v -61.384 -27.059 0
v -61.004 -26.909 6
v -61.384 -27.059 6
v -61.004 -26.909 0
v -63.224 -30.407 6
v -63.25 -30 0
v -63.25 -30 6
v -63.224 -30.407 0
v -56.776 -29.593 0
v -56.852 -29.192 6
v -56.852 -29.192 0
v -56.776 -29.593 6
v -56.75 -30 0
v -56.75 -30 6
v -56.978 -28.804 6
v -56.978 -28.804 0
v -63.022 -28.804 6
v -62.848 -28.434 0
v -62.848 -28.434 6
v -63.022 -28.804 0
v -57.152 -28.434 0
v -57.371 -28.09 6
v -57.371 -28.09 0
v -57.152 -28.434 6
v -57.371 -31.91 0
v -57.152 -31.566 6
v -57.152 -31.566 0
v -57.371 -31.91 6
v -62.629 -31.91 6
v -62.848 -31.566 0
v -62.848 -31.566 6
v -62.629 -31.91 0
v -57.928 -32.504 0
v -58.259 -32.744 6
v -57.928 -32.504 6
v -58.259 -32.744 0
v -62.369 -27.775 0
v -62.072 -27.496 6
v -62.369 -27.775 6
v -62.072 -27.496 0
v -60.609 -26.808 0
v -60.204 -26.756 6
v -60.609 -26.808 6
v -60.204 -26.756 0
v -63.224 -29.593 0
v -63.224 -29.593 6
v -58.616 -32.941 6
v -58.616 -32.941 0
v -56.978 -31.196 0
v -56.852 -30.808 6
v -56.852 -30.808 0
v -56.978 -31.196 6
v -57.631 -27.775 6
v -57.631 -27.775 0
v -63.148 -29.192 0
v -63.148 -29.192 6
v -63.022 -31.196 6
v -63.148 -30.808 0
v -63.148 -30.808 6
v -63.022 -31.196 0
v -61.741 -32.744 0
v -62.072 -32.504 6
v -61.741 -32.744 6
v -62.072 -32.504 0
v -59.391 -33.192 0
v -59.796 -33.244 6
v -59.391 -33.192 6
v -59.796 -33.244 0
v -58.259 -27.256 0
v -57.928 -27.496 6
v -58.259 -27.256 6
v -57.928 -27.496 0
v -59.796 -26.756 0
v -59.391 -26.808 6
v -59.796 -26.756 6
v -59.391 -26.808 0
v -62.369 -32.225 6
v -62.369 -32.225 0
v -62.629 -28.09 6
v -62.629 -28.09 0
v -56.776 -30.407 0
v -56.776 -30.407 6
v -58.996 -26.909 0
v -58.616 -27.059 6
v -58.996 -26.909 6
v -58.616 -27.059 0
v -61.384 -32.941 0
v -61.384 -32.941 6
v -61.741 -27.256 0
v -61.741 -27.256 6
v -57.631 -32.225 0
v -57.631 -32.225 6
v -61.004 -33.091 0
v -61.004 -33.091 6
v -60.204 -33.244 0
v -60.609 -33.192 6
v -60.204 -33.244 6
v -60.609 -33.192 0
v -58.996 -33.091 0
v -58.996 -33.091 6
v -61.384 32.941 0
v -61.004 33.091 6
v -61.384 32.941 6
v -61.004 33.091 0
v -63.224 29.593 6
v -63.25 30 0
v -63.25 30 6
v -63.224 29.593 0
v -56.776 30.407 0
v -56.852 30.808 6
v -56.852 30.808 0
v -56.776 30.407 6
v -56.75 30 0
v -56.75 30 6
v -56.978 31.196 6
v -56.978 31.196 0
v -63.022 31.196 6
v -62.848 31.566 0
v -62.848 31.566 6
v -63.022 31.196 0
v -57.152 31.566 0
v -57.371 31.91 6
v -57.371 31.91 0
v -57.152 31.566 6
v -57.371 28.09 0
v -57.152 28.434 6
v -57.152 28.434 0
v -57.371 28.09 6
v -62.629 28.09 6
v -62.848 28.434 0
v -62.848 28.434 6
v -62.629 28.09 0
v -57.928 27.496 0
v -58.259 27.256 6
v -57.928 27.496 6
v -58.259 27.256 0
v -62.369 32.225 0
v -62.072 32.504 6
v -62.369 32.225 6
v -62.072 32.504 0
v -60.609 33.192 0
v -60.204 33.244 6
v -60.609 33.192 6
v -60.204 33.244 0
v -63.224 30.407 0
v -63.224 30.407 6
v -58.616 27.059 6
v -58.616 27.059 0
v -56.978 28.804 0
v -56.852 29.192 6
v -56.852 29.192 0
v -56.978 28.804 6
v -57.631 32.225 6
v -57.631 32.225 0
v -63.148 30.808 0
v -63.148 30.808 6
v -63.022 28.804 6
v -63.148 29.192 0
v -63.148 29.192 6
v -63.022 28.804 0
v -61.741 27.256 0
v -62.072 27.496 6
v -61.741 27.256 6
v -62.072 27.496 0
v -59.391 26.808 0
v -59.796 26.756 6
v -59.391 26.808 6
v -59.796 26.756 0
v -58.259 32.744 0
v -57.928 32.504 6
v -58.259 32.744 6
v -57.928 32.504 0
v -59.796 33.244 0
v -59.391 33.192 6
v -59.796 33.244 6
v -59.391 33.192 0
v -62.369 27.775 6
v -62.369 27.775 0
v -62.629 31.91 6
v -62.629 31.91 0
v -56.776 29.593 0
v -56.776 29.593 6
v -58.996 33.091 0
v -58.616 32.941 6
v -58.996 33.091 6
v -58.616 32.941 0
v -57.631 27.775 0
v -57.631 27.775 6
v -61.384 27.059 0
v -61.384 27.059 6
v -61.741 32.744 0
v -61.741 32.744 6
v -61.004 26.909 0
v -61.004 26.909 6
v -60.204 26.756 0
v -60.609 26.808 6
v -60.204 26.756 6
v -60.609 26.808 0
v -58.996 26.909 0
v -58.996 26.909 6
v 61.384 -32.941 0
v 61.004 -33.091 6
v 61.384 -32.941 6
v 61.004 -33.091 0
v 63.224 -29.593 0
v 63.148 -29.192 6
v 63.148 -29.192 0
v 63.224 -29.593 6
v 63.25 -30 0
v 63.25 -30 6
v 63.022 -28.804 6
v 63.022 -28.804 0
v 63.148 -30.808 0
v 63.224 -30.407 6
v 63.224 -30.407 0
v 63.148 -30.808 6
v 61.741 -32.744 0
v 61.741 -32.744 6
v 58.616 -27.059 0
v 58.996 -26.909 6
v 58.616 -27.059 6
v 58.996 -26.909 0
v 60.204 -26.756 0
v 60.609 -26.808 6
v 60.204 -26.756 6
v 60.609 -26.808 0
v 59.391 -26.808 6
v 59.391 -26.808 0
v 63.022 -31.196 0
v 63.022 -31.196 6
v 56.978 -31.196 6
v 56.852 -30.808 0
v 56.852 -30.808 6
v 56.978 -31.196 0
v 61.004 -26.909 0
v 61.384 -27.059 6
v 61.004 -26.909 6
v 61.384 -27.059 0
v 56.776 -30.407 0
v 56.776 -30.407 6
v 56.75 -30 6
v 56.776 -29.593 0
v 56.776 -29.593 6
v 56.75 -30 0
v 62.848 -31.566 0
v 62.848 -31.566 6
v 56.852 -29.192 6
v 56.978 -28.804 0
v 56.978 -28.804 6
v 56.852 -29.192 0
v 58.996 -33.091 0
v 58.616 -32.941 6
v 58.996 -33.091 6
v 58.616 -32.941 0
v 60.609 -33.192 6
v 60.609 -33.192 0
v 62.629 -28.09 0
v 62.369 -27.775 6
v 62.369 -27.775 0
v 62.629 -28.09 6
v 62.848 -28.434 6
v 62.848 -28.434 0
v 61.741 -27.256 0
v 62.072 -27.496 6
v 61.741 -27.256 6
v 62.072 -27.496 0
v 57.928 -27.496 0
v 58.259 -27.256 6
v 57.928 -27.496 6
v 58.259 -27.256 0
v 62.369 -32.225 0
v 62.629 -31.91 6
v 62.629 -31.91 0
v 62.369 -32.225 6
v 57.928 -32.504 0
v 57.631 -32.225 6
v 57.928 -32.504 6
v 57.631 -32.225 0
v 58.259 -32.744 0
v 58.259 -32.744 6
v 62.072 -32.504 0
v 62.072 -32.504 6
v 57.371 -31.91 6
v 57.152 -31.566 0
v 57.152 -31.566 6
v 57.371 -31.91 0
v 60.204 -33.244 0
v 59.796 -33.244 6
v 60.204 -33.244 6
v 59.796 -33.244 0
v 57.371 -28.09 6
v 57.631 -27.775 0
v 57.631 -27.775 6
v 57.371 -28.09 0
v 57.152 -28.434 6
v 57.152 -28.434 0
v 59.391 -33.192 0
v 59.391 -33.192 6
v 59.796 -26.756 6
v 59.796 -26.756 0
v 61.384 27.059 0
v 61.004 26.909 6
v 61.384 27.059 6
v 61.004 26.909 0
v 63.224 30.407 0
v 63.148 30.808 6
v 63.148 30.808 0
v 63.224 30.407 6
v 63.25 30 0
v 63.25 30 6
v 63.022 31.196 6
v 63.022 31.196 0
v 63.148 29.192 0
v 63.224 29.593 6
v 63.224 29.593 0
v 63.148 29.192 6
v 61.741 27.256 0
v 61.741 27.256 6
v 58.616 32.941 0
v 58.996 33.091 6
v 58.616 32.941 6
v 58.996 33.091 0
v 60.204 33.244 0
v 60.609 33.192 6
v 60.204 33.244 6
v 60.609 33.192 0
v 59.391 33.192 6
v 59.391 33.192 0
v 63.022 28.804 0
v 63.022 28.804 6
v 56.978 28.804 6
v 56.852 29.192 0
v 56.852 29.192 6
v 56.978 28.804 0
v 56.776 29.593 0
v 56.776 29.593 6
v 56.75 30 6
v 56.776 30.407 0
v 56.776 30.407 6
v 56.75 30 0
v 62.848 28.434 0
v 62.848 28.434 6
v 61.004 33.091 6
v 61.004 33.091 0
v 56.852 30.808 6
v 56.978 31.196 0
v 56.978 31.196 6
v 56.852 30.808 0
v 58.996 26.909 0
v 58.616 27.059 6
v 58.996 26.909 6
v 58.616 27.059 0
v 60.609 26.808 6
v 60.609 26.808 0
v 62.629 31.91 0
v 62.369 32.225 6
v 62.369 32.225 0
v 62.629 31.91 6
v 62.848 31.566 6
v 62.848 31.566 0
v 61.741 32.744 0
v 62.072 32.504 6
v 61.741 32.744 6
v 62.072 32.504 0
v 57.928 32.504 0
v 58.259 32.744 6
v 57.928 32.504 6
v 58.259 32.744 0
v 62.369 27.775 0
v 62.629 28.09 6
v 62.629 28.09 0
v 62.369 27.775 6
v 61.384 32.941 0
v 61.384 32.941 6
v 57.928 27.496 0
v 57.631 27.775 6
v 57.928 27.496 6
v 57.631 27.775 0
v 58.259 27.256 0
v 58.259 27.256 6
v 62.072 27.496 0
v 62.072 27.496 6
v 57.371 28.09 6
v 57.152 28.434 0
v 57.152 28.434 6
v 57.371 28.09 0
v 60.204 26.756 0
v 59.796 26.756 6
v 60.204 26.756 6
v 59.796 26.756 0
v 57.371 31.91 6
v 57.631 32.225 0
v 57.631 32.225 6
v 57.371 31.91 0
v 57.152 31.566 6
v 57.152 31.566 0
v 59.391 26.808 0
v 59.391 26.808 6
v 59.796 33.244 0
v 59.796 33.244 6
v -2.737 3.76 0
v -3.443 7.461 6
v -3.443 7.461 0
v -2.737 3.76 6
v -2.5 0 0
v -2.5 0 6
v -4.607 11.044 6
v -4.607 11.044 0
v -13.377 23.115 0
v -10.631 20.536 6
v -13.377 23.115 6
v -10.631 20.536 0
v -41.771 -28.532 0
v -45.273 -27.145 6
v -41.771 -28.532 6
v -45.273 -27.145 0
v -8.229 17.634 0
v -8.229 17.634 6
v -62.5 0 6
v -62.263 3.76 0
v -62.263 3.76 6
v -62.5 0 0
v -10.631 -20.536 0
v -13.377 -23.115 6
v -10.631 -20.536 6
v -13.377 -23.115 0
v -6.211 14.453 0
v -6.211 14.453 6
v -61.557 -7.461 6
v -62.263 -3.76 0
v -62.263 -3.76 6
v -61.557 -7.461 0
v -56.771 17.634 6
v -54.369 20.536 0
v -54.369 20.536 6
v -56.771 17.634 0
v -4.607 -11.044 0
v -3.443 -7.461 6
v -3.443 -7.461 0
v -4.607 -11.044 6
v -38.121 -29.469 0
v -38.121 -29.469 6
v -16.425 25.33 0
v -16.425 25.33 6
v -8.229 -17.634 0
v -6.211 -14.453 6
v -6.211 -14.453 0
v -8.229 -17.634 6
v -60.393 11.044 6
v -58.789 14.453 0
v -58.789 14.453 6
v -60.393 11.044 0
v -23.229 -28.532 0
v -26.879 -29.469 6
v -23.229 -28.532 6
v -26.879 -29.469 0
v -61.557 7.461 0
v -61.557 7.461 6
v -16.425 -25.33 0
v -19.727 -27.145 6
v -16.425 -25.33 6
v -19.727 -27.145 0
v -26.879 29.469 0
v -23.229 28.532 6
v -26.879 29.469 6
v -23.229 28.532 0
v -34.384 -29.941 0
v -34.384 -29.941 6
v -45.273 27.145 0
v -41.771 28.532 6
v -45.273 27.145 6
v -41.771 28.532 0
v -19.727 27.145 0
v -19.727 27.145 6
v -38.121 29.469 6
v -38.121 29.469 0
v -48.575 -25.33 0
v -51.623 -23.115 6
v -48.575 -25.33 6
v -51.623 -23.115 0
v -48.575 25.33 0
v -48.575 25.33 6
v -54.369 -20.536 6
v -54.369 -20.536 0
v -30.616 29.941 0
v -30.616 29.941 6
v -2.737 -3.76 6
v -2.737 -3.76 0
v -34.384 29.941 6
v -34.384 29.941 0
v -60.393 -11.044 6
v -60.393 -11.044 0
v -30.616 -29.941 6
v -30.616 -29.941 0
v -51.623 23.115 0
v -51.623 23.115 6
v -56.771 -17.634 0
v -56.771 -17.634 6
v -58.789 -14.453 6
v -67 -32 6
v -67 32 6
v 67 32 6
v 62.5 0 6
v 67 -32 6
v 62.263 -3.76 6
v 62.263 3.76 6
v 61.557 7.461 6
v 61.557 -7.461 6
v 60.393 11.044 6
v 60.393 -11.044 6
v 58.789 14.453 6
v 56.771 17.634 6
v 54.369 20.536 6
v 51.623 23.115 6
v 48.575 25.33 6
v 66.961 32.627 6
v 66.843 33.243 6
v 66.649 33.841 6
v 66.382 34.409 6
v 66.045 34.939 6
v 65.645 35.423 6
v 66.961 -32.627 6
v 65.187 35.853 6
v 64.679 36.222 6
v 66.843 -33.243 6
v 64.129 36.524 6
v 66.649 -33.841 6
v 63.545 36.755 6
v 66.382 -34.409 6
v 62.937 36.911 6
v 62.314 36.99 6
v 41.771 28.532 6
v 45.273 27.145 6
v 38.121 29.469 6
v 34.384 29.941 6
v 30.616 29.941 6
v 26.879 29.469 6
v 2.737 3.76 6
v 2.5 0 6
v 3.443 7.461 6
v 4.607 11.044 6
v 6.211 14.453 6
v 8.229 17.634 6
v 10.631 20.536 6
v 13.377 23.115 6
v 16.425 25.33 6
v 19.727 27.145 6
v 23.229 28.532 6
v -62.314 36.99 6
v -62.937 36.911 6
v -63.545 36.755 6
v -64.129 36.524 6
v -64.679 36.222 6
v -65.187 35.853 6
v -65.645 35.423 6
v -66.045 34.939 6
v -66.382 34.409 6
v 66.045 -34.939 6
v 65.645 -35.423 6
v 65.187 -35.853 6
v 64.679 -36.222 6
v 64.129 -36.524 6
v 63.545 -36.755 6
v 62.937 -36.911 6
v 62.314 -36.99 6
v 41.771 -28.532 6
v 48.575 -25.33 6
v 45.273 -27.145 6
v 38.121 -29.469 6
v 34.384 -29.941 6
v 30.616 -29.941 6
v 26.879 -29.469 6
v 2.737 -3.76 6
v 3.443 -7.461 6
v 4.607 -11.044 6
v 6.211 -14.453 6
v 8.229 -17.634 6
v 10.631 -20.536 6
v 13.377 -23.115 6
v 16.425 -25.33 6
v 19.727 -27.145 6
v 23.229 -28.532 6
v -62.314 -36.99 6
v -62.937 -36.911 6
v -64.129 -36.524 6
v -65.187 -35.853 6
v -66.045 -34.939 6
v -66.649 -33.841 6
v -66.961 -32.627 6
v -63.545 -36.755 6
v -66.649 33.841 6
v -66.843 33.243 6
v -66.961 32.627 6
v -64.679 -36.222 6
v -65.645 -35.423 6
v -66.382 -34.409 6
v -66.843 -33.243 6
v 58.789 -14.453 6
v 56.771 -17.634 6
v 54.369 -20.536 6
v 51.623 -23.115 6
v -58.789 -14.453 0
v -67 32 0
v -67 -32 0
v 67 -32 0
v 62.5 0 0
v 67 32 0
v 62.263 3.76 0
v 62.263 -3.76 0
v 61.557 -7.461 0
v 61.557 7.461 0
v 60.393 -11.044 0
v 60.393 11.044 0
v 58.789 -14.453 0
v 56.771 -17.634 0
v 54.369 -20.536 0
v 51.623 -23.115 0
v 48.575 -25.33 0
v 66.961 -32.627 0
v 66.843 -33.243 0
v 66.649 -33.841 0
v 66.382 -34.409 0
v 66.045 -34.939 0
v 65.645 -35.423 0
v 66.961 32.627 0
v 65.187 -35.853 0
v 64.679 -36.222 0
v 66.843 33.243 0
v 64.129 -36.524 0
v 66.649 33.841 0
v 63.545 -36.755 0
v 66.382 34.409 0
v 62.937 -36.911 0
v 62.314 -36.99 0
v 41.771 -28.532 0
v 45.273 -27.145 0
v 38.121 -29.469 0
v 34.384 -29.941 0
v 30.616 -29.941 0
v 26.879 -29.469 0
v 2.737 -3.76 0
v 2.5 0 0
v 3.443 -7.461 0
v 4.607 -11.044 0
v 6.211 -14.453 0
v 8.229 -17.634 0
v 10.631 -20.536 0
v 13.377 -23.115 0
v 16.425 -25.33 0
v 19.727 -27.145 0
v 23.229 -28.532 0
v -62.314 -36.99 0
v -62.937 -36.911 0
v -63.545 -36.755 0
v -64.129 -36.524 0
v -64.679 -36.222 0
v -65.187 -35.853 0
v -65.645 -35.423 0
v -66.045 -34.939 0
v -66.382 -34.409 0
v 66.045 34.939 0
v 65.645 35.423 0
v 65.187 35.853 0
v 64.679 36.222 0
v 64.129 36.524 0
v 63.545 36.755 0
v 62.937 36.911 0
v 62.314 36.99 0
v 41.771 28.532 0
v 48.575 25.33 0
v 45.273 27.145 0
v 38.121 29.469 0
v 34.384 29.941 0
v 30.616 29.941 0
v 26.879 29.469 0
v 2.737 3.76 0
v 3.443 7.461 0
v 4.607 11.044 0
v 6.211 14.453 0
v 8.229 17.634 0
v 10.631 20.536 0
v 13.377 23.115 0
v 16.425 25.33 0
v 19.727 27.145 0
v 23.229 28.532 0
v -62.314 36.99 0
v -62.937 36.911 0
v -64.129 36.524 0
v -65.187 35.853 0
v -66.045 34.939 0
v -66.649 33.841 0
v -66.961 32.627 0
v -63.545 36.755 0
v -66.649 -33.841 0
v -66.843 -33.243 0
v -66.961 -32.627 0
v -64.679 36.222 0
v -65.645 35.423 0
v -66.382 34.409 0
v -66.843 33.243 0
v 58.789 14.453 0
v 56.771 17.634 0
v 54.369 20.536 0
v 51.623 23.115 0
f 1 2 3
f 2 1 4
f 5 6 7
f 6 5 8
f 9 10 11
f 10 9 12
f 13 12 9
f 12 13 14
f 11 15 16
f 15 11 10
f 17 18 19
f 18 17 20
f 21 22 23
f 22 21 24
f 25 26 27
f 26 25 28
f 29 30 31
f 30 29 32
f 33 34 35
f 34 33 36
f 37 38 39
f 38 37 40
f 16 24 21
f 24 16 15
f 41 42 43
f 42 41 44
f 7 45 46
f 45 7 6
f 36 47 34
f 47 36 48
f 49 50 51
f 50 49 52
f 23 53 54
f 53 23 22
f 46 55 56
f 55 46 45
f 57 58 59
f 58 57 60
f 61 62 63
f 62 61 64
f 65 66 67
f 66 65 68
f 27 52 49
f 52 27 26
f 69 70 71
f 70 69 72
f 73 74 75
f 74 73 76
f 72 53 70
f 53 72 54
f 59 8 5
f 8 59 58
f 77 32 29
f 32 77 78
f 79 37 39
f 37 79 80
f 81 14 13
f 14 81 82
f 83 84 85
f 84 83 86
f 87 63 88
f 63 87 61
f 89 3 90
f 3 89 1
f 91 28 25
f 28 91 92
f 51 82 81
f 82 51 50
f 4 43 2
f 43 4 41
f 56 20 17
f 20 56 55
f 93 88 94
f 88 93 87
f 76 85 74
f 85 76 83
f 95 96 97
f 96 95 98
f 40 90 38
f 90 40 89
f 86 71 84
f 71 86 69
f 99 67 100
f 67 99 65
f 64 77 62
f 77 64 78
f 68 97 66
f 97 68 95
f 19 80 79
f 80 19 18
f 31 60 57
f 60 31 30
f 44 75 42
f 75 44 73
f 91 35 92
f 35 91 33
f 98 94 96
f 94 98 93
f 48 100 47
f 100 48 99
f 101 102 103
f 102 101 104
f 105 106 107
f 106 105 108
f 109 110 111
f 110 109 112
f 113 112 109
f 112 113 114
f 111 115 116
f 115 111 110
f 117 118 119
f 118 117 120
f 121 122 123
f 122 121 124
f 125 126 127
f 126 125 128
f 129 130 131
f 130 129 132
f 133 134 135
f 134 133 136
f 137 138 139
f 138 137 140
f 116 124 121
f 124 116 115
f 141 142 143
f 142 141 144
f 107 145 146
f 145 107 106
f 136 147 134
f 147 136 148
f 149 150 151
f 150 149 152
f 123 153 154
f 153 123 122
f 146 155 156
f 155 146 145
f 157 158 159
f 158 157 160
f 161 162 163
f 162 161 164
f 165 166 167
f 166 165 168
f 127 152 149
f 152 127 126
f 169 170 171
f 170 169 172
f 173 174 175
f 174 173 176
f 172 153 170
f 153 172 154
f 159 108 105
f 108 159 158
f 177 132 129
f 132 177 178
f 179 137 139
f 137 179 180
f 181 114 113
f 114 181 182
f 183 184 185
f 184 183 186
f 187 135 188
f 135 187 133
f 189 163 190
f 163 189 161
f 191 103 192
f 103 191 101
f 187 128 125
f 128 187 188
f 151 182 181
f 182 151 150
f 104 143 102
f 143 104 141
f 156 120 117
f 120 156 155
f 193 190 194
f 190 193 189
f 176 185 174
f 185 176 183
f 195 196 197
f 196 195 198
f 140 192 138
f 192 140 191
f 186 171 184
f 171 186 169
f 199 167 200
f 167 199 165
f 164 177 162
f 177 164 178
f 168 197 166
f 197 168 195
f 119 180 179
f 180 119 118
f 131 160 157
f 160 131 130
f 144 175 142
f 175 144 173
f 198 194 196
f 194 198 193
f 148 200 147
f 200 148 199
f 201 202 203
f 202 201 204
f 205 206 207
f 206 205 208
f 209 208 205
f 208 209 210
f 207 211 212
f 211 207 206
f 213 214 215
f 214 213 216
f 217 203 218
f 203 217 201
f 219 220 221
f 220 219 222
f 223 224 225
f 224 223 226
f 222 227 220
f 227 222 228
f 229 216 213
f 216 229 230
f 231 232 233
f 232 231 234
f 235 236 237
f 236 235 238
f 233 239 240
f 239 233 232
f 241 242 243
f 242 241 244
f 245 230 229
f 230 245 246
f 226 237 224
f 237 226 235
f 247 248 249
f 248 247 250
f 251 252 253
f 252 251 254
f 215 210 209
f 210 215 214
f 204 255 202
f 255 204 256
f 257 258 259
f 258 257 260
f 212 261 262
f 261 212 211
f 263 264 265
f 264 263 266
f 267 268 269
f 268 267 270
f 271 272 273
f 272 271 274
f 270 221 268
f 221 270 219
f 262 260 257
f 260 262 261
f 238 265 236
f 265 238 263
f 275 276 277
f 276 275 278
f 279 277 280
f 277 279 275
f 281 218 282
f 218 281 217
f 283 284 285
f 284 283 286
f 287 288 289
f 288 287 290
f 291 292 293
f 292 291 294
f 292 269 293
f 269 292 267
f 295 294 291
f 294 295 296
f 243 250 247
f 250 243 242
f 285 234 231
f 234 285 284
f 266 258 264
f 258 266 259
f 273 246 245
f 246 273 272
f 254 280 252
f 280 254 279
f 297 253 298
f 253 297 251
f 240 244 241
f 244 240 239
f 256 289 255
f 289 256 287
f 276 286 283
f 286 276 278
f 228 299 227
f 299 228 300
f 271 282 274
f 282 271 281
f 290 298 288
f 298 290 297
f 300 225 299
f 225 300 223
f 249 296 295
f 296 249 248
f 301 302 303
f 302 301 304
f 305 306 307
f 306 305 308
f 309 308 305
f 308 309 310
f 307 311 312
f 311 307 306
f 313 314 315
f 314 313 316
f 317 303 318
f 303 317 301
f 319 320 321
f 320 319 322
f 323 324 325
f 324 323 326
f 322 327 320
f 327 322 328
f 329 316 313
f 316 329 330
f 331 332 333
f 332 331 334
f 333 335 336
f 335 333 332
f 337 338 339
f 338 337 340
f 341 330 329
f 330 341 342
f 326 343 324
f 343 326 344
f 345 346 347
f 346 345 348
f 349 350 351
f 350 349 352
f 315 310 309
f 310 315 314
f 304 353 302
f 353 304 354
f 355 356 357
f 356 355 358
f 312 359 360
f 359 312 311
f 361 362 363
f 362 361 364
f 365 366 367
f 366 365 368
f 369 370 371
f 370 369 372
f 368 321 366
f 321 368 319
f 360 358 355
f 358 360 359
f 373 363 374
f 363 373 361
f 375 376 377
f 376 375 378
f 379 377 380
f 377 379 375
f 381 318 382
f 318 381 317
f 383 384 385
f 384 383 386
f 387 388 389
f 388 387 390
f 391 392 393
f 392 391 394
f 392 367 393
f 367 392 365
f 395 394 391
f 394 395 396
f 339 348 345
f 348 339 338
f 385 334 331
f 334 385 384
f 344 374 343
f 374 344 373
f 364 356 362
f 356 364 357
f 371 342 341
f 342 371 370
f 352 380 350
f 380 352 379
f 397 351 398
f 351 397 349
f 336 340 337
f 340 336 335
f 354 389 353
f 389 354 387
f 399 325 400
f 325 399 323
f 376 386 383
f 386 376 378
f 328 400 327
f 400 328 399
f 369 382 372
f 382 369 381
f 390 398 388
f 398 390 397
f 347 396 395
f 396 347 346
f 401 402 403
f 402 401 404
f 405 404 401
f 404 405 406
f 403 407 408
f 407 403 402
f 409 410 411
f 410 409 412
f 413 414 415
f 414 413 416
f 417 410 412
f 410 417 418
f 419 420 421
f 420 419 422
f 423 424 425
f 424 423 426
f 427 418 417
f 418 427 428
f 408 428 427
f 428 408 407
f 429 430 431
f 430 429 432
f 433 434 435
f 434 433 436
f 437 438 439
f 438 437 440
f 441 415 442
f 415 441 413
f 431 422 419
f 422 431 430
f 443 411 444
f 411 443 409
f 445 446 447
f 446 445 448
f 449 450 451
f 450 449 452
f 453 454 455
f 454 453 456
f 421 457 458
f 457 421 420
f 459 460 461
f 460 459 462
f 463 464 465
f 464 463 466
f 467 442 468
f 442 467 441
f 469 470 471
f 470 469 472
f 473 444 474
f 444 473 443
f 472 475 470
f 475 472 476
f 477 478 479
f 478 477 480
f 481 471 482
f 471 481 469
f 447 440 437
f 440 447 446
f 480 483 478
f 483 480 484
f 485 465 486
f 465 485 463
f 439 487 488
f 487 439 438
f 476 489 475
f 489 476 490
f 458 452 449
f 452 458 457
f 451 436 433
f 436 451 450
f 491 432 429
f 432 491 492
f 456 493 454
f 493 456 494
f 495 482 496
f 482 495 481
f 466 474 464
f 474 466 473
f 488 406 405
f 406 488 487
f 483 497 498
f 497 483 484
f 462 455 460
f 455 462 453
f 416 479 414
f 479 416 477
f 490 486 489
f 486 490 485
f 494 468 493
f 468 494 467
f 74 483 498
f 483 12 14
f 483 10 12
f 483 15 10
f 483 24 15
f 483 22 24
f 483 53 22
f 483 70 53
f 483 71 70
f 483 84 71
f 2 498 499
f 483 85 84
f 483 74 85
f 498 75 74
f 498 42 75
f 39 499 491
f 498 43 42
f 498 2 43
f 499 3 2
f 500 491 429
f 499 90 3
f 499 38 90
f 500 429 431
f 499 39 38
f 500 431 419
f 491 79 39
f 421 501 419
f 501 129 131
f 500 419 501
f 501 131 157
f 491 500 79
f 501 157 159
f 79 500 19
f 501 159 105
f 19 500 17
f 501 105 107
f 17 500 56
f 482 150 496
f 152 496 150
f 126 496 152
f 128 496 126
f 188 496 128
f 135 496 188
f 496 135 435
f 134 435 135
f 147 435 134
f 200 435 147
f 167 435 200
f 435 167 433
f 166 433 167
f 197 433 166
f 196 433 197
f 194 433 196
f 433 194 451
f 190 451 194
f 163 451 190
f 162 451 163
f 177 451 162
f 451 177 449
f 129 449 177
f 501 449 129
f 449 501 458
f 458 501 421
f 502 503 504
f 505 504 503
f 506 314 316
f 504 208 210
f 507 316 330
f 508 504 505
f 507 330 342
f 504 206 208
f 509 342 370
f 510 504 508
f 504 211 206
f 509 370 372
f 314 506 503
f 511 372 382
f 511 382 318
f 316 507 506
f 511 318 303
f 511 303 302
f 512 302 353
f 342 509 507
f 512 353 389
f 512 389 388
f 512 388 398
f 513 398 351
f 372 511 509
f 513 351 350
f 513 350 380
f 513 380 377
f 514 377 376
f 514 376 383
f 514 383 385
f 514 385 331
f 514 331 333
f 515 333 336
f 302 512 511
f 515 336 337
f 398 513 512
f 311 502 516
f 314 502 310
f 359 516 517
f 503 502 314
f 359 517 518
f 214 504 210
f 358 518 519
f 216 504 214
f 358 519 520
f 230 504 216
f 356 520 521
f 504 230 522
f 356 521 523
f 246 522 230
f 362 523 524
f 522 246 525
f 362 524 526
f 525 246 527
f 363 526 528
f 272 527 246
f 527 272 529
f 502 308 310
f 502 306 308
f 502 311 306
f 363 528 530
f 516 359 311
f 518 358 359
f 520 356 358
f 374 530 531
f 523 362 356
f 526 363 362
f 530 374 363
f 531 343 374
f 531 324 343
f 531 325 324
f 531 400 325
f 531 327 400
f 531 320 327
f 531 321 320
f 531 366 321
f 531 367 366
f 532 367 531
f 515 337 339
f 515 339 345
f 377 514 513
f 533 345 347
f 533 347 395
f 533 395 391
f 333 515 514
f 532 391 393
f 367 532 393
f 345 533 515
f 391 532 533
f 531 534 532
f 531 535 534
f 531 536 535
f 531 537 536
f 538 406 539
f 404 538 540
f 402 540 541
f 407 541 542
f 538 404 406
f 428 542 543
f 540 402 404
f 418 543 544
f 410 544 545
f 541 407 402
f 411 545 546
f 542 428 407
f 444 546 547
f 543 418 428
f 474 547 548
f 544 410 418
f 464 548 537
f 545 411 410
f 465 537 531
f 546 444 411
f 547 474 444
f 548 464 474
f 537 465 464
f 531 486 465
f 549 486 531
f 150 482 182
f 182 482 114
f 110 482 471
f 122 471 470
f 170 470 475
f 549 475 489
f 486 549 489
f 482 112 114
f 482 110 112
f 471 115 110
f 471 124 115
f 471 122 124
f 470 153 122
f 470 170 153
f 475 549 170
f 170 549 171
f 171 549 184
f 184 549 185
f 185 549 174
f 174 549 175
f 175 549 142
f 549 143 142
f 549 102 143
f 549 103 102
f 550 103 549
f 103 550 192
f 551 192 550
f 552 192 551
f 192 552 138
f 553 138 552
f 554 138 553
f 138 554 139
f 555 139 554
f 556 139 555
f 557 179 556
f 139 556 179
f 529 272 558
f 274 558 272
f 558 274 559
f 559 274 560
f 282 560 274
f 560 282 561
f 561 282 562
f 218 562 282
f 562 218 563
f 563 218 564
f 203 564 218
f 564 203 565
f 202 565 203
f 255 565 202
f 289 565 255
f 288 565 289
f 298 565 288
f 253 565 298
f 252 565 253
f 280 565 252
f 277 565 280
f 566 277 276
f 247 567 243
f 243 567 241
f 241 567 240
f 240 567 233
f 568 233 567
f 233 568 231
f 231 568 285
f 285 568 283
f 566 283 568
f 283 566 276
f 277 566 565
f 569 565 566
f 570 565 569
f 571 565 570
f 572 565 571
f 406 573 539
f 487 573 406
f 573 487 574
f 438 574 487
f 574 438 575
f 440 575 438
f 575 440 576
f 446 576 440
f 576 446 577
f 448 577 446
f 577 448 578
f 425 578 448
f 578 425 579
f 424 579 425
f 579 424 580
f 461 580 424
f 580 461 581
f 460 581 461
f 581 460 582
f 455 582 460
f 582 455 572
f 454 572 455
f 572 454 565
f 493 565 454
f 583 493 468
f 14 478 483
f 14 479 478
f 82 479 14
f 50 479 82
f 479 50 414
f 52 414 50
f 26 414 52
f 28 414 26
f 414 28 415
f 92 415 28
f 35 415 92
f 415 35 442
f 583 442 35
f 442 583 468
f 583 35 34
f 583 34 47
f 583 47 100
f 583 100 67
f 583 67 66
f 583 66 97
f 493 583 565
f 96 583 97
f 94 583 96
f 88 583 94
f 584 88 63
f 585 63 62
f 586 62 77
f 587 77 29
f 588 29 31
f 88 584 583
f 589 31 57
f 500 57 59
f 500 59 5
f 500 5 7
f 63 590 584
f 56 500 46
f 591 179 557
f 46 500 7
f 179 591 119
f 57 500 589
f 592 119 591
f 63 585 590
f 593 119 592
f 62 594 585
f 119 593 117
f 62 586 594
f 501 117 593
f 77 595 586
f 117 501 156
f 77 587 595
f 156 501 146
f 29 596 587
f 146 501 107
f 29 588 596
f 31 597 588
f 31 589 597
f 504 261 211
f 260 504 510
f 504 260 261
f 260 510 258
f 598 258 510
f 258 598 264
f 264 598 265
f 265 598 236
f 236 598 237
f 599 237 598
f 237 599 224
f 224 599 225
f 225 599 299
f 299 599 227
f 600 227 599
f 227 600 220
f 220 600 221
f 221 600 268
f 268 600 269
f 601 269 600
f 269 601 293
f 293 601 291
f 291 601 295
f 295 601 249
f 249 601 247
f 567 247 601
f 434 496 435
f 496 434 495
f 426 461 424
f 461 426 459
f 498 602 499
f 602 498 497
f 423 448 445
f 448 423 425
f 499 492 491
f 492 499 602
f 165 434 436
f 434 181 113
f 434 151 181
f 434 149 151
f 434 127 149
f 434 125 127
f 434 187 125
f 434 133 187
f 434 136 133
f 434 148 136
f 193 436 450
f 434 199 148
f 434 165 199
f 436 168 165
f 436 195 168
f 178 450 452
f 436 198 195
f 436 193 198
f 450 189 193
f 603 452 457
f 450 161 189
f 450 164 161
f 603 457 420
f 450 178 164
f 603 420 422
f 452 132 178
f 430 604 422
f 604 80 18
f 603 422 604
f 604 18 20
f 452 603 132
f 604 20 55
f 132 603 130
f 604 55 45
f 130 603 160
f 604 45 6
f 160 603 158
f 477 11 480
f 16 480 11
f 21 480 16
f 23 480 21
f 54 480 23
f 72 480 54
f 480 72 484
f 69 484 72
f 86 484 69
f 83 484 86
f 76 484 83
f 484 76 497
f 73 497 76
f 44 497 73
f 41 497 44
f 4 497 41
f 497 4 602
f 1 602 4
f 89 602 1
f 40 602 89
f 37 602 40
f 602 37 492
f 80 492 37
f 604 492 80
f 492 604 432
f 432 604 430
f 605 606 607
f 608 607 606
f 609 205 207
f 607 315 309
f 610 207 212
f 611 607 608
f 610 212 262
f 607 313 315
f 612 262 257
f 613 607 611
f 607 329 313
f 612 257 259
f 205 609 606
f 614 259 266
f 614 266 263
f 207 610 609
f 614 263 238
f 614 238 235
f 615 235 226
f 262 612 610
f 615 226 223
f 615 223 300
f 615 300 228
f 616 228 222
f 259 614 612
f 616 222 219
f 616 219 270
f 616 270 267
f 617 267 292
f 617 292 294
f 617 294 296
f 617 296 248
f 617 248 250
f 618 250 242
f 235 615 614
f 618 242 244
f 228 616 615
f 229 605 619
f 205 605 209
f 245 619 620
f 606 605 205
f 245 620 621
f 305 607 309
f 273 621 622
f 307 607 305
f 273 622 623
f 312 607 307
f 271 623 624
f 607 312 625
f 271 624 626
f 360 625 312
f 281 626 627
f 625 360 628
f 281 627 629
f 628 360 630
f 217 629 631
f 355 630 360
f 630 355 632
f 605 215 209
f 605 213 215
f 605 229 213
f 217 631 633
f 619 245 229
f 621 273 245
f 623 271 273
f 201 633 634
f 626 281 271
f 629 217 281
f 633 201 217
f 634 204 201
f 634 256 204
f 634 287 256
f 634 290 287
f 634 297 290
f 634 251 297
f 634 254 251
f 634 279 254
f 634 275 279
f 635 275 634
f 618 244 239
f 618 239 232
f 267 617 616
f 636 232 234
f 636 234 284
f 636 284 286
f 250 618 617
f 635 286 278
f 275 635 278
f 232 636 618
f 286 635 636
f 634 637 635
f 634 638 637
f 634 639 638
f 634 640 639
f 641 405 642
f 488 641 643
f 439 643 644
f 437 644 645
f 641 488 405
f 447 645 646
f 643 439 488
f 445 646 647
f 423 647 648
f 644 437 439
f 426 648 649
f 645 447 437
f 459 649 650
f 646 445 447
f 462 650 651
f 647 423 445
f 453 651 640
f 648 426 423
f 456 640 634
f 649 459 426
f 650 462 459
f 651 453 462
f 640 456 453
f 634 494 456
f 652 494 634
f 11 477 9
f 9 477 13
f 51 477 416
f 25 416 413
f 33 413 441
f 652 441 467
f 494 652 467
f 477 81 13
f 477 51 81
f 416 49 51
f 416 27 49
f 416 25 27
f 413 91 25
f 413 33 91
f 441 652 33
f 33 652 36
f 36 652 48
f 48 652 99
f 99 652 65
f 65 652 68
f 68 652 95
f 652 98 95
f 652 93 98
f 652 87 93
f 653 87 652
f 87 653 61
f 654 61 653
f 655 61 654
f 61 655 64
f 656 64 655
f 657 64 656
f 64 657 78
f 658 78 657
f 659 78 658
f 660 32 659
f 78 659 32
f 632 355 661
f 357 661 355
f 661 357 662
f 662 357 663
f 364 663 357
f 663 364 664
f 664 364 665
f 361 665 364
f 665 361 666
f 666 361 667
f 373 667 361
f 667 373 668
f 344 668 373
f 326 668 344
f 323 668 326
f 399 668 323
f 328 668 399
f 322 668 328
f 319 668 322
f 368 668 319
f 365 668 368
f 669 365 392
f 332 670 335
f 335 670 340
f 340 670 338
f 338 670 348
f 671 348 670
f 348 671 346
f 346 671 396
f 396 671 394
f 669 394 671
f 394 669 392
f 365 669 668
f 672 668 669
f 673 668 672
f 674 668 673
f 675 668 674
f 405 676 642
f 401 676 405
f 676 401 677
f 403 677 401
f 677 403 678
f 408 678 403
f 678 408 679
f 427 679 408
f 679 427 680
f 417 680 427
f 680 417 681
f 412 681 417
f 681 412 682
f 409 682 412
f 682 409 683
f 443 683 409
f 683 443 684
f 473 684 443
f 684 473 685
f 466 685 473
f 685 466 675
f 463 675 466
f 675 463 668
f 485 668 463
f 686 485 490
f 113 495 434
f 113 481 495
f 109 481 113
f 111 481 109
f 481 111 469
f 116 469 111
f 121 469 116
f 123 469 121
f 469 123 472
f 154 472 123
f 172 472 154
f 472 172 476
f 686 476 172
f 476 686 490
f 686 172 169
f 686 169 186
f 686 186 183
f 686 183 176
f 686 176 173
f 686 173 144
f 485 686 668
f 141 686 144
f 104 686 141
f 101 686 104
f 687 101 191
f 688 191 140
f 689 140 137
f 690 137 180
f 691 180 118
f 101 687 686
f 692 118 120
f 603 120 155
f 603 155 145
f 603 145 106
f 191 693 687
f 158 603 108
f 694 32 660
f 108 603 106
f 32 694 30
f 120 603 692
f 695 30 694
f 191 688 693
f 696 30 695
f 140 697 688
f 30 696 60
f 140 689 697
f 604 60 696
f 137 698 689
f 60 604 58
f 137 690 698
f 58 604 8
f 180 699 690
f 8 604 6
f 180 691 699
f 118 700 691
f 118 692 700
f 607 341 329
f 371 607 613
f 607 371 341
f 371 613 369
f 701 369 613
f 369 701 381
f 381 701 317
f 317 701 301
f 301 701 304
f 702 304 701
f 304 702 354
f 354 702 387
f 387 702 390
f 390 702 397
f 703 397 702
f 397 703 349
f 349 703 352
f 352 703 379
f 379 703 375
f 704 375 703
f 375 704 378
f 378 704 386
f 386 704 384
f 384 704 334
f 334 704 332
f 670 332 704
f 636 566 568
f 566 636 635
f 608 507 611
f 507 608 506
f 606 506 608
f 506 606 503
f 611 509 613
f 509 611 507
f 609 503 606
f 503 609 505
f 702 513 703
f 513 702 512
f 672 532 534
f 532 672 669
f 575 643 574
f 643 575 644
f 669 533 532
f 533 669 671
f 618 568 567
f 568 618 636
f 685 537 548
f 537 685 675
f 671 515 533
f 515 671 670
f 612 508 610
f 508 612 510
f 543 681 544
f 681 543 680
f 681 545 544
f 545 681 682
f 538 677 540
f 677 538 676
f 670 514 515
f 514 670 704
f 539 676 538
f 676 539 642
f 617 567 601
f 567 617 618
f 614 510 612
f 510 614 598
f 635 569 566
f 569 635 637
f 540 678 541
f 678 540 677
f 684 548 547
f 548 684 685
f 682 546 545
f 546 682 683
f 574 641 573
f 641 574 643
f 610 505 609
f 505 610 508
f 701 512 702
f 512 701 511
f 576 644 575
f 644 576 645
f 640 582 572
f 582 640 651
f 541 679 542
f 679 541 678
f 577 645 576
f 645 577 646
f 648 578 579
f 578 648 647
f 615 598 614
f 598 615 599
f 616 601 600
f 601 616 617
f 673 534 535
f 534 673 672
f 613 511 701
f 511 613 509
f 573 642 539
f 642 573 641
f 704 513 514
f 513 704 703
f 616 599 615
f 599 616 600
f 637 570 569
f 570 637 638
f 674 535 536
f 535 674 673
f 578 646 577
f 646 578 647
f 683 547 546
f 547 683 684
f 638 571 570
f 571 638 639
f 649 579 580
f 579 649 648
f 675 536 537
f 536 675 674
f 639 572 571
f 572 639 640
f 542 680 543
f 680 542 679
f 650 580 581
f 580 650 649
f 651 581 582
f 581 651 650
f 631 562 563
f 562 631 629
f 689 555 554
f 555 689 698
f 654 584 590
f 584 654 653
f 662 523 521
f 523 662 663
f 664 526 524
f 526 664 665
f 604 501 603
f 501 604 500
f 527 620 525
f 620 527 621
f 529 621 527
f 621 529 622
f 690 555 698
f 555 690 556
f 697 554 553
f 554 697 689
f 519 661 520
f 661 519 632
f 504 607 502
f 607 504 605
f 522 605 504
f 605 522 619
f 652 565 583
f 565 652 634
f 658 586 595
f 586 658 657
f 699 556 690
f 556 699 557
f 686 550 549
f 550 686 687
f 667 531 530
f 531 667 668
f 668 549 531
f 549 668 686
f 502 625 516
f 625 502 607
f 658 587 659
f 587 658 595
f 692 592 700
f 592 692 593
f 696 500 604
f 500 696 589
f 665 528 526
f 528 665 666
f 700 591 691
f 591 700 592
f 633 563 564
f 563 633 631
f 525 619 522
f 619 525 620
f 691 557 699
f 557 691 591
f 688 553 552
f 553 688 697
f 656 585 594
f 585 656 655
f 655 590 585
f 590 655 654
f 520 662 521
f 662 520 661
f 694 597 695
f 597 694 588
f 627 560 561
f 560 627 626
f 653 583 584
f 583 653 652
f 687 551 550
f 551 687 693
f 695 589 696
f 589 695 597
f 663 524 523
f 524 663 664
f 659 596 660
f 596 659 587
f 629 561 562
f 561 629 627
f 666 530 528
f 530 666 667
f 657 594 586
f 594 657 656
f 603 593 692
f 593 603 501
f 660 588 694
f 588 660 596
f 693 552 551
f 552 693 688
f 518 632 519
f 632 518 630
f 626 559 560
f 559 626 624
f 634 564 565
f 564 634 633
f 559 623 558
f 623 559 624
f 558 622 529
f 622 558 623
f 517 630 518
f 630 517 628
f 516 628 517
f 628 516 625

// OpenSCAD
$fn = 50;

difference() {
	union() {
		hull() {
			translate(v = [-62.0, 32.0, 0]) {
				cylinder(h = 6, r = 5);
			}
			translate(v = [62.0, 32.0, 0]) {
				cylinder(h = 6, r = 5);
			}
			translate(v = [-62.0, -32.0, 0]) {
				cylinder(h = 6, r = 5);
			}
			translate(v = [62.0, -32.0, 0]) {
				cylinder(h = 6, r = 5);
			}
		}
	}
	union() {
		translate(v = [-60.0, -30.0, -100.0]) {
			cylinder(h = 200, r = 3.25);
		}
		translate(v = [-60.0, 30.0, -100.0]) {
			cylinder(h = 200, r = 3.25);
		}
		translate(v = [60.0, -30.0, -100.0]) {
			cylinder(h = 200, r = 3.25);
		}
		translate(v = [60.0, 30.0, -100.0]) {
			cylinder(h = 200, r = 3.25);
		}
		translate(v = [-60.0, -30.0, -100.0]) {
			cylinder(h = 200, r = 1.8);
		}
		translate(v = [-60.0, 30.0, -100.0]) {
			cylinder(h = 200, r = 1.8);
		}
		translate(v = [60.0, -30.0, -100.0]) {
			cylinder(h = 200, r = 1.8);
		}
		translate(v = [60.0, 30.0, -100.0]) {
			cylinder(h = 200, r = 1.8);
		}
		translate(v = [-32.5, 0, 0.0]) {
			cylinder(h = 6, r = 30.0);
		}
		translate(v = [32.5, 0, 0.0]) {
			cylinder(h = 6, r = 30.0);
		}
	}
}
